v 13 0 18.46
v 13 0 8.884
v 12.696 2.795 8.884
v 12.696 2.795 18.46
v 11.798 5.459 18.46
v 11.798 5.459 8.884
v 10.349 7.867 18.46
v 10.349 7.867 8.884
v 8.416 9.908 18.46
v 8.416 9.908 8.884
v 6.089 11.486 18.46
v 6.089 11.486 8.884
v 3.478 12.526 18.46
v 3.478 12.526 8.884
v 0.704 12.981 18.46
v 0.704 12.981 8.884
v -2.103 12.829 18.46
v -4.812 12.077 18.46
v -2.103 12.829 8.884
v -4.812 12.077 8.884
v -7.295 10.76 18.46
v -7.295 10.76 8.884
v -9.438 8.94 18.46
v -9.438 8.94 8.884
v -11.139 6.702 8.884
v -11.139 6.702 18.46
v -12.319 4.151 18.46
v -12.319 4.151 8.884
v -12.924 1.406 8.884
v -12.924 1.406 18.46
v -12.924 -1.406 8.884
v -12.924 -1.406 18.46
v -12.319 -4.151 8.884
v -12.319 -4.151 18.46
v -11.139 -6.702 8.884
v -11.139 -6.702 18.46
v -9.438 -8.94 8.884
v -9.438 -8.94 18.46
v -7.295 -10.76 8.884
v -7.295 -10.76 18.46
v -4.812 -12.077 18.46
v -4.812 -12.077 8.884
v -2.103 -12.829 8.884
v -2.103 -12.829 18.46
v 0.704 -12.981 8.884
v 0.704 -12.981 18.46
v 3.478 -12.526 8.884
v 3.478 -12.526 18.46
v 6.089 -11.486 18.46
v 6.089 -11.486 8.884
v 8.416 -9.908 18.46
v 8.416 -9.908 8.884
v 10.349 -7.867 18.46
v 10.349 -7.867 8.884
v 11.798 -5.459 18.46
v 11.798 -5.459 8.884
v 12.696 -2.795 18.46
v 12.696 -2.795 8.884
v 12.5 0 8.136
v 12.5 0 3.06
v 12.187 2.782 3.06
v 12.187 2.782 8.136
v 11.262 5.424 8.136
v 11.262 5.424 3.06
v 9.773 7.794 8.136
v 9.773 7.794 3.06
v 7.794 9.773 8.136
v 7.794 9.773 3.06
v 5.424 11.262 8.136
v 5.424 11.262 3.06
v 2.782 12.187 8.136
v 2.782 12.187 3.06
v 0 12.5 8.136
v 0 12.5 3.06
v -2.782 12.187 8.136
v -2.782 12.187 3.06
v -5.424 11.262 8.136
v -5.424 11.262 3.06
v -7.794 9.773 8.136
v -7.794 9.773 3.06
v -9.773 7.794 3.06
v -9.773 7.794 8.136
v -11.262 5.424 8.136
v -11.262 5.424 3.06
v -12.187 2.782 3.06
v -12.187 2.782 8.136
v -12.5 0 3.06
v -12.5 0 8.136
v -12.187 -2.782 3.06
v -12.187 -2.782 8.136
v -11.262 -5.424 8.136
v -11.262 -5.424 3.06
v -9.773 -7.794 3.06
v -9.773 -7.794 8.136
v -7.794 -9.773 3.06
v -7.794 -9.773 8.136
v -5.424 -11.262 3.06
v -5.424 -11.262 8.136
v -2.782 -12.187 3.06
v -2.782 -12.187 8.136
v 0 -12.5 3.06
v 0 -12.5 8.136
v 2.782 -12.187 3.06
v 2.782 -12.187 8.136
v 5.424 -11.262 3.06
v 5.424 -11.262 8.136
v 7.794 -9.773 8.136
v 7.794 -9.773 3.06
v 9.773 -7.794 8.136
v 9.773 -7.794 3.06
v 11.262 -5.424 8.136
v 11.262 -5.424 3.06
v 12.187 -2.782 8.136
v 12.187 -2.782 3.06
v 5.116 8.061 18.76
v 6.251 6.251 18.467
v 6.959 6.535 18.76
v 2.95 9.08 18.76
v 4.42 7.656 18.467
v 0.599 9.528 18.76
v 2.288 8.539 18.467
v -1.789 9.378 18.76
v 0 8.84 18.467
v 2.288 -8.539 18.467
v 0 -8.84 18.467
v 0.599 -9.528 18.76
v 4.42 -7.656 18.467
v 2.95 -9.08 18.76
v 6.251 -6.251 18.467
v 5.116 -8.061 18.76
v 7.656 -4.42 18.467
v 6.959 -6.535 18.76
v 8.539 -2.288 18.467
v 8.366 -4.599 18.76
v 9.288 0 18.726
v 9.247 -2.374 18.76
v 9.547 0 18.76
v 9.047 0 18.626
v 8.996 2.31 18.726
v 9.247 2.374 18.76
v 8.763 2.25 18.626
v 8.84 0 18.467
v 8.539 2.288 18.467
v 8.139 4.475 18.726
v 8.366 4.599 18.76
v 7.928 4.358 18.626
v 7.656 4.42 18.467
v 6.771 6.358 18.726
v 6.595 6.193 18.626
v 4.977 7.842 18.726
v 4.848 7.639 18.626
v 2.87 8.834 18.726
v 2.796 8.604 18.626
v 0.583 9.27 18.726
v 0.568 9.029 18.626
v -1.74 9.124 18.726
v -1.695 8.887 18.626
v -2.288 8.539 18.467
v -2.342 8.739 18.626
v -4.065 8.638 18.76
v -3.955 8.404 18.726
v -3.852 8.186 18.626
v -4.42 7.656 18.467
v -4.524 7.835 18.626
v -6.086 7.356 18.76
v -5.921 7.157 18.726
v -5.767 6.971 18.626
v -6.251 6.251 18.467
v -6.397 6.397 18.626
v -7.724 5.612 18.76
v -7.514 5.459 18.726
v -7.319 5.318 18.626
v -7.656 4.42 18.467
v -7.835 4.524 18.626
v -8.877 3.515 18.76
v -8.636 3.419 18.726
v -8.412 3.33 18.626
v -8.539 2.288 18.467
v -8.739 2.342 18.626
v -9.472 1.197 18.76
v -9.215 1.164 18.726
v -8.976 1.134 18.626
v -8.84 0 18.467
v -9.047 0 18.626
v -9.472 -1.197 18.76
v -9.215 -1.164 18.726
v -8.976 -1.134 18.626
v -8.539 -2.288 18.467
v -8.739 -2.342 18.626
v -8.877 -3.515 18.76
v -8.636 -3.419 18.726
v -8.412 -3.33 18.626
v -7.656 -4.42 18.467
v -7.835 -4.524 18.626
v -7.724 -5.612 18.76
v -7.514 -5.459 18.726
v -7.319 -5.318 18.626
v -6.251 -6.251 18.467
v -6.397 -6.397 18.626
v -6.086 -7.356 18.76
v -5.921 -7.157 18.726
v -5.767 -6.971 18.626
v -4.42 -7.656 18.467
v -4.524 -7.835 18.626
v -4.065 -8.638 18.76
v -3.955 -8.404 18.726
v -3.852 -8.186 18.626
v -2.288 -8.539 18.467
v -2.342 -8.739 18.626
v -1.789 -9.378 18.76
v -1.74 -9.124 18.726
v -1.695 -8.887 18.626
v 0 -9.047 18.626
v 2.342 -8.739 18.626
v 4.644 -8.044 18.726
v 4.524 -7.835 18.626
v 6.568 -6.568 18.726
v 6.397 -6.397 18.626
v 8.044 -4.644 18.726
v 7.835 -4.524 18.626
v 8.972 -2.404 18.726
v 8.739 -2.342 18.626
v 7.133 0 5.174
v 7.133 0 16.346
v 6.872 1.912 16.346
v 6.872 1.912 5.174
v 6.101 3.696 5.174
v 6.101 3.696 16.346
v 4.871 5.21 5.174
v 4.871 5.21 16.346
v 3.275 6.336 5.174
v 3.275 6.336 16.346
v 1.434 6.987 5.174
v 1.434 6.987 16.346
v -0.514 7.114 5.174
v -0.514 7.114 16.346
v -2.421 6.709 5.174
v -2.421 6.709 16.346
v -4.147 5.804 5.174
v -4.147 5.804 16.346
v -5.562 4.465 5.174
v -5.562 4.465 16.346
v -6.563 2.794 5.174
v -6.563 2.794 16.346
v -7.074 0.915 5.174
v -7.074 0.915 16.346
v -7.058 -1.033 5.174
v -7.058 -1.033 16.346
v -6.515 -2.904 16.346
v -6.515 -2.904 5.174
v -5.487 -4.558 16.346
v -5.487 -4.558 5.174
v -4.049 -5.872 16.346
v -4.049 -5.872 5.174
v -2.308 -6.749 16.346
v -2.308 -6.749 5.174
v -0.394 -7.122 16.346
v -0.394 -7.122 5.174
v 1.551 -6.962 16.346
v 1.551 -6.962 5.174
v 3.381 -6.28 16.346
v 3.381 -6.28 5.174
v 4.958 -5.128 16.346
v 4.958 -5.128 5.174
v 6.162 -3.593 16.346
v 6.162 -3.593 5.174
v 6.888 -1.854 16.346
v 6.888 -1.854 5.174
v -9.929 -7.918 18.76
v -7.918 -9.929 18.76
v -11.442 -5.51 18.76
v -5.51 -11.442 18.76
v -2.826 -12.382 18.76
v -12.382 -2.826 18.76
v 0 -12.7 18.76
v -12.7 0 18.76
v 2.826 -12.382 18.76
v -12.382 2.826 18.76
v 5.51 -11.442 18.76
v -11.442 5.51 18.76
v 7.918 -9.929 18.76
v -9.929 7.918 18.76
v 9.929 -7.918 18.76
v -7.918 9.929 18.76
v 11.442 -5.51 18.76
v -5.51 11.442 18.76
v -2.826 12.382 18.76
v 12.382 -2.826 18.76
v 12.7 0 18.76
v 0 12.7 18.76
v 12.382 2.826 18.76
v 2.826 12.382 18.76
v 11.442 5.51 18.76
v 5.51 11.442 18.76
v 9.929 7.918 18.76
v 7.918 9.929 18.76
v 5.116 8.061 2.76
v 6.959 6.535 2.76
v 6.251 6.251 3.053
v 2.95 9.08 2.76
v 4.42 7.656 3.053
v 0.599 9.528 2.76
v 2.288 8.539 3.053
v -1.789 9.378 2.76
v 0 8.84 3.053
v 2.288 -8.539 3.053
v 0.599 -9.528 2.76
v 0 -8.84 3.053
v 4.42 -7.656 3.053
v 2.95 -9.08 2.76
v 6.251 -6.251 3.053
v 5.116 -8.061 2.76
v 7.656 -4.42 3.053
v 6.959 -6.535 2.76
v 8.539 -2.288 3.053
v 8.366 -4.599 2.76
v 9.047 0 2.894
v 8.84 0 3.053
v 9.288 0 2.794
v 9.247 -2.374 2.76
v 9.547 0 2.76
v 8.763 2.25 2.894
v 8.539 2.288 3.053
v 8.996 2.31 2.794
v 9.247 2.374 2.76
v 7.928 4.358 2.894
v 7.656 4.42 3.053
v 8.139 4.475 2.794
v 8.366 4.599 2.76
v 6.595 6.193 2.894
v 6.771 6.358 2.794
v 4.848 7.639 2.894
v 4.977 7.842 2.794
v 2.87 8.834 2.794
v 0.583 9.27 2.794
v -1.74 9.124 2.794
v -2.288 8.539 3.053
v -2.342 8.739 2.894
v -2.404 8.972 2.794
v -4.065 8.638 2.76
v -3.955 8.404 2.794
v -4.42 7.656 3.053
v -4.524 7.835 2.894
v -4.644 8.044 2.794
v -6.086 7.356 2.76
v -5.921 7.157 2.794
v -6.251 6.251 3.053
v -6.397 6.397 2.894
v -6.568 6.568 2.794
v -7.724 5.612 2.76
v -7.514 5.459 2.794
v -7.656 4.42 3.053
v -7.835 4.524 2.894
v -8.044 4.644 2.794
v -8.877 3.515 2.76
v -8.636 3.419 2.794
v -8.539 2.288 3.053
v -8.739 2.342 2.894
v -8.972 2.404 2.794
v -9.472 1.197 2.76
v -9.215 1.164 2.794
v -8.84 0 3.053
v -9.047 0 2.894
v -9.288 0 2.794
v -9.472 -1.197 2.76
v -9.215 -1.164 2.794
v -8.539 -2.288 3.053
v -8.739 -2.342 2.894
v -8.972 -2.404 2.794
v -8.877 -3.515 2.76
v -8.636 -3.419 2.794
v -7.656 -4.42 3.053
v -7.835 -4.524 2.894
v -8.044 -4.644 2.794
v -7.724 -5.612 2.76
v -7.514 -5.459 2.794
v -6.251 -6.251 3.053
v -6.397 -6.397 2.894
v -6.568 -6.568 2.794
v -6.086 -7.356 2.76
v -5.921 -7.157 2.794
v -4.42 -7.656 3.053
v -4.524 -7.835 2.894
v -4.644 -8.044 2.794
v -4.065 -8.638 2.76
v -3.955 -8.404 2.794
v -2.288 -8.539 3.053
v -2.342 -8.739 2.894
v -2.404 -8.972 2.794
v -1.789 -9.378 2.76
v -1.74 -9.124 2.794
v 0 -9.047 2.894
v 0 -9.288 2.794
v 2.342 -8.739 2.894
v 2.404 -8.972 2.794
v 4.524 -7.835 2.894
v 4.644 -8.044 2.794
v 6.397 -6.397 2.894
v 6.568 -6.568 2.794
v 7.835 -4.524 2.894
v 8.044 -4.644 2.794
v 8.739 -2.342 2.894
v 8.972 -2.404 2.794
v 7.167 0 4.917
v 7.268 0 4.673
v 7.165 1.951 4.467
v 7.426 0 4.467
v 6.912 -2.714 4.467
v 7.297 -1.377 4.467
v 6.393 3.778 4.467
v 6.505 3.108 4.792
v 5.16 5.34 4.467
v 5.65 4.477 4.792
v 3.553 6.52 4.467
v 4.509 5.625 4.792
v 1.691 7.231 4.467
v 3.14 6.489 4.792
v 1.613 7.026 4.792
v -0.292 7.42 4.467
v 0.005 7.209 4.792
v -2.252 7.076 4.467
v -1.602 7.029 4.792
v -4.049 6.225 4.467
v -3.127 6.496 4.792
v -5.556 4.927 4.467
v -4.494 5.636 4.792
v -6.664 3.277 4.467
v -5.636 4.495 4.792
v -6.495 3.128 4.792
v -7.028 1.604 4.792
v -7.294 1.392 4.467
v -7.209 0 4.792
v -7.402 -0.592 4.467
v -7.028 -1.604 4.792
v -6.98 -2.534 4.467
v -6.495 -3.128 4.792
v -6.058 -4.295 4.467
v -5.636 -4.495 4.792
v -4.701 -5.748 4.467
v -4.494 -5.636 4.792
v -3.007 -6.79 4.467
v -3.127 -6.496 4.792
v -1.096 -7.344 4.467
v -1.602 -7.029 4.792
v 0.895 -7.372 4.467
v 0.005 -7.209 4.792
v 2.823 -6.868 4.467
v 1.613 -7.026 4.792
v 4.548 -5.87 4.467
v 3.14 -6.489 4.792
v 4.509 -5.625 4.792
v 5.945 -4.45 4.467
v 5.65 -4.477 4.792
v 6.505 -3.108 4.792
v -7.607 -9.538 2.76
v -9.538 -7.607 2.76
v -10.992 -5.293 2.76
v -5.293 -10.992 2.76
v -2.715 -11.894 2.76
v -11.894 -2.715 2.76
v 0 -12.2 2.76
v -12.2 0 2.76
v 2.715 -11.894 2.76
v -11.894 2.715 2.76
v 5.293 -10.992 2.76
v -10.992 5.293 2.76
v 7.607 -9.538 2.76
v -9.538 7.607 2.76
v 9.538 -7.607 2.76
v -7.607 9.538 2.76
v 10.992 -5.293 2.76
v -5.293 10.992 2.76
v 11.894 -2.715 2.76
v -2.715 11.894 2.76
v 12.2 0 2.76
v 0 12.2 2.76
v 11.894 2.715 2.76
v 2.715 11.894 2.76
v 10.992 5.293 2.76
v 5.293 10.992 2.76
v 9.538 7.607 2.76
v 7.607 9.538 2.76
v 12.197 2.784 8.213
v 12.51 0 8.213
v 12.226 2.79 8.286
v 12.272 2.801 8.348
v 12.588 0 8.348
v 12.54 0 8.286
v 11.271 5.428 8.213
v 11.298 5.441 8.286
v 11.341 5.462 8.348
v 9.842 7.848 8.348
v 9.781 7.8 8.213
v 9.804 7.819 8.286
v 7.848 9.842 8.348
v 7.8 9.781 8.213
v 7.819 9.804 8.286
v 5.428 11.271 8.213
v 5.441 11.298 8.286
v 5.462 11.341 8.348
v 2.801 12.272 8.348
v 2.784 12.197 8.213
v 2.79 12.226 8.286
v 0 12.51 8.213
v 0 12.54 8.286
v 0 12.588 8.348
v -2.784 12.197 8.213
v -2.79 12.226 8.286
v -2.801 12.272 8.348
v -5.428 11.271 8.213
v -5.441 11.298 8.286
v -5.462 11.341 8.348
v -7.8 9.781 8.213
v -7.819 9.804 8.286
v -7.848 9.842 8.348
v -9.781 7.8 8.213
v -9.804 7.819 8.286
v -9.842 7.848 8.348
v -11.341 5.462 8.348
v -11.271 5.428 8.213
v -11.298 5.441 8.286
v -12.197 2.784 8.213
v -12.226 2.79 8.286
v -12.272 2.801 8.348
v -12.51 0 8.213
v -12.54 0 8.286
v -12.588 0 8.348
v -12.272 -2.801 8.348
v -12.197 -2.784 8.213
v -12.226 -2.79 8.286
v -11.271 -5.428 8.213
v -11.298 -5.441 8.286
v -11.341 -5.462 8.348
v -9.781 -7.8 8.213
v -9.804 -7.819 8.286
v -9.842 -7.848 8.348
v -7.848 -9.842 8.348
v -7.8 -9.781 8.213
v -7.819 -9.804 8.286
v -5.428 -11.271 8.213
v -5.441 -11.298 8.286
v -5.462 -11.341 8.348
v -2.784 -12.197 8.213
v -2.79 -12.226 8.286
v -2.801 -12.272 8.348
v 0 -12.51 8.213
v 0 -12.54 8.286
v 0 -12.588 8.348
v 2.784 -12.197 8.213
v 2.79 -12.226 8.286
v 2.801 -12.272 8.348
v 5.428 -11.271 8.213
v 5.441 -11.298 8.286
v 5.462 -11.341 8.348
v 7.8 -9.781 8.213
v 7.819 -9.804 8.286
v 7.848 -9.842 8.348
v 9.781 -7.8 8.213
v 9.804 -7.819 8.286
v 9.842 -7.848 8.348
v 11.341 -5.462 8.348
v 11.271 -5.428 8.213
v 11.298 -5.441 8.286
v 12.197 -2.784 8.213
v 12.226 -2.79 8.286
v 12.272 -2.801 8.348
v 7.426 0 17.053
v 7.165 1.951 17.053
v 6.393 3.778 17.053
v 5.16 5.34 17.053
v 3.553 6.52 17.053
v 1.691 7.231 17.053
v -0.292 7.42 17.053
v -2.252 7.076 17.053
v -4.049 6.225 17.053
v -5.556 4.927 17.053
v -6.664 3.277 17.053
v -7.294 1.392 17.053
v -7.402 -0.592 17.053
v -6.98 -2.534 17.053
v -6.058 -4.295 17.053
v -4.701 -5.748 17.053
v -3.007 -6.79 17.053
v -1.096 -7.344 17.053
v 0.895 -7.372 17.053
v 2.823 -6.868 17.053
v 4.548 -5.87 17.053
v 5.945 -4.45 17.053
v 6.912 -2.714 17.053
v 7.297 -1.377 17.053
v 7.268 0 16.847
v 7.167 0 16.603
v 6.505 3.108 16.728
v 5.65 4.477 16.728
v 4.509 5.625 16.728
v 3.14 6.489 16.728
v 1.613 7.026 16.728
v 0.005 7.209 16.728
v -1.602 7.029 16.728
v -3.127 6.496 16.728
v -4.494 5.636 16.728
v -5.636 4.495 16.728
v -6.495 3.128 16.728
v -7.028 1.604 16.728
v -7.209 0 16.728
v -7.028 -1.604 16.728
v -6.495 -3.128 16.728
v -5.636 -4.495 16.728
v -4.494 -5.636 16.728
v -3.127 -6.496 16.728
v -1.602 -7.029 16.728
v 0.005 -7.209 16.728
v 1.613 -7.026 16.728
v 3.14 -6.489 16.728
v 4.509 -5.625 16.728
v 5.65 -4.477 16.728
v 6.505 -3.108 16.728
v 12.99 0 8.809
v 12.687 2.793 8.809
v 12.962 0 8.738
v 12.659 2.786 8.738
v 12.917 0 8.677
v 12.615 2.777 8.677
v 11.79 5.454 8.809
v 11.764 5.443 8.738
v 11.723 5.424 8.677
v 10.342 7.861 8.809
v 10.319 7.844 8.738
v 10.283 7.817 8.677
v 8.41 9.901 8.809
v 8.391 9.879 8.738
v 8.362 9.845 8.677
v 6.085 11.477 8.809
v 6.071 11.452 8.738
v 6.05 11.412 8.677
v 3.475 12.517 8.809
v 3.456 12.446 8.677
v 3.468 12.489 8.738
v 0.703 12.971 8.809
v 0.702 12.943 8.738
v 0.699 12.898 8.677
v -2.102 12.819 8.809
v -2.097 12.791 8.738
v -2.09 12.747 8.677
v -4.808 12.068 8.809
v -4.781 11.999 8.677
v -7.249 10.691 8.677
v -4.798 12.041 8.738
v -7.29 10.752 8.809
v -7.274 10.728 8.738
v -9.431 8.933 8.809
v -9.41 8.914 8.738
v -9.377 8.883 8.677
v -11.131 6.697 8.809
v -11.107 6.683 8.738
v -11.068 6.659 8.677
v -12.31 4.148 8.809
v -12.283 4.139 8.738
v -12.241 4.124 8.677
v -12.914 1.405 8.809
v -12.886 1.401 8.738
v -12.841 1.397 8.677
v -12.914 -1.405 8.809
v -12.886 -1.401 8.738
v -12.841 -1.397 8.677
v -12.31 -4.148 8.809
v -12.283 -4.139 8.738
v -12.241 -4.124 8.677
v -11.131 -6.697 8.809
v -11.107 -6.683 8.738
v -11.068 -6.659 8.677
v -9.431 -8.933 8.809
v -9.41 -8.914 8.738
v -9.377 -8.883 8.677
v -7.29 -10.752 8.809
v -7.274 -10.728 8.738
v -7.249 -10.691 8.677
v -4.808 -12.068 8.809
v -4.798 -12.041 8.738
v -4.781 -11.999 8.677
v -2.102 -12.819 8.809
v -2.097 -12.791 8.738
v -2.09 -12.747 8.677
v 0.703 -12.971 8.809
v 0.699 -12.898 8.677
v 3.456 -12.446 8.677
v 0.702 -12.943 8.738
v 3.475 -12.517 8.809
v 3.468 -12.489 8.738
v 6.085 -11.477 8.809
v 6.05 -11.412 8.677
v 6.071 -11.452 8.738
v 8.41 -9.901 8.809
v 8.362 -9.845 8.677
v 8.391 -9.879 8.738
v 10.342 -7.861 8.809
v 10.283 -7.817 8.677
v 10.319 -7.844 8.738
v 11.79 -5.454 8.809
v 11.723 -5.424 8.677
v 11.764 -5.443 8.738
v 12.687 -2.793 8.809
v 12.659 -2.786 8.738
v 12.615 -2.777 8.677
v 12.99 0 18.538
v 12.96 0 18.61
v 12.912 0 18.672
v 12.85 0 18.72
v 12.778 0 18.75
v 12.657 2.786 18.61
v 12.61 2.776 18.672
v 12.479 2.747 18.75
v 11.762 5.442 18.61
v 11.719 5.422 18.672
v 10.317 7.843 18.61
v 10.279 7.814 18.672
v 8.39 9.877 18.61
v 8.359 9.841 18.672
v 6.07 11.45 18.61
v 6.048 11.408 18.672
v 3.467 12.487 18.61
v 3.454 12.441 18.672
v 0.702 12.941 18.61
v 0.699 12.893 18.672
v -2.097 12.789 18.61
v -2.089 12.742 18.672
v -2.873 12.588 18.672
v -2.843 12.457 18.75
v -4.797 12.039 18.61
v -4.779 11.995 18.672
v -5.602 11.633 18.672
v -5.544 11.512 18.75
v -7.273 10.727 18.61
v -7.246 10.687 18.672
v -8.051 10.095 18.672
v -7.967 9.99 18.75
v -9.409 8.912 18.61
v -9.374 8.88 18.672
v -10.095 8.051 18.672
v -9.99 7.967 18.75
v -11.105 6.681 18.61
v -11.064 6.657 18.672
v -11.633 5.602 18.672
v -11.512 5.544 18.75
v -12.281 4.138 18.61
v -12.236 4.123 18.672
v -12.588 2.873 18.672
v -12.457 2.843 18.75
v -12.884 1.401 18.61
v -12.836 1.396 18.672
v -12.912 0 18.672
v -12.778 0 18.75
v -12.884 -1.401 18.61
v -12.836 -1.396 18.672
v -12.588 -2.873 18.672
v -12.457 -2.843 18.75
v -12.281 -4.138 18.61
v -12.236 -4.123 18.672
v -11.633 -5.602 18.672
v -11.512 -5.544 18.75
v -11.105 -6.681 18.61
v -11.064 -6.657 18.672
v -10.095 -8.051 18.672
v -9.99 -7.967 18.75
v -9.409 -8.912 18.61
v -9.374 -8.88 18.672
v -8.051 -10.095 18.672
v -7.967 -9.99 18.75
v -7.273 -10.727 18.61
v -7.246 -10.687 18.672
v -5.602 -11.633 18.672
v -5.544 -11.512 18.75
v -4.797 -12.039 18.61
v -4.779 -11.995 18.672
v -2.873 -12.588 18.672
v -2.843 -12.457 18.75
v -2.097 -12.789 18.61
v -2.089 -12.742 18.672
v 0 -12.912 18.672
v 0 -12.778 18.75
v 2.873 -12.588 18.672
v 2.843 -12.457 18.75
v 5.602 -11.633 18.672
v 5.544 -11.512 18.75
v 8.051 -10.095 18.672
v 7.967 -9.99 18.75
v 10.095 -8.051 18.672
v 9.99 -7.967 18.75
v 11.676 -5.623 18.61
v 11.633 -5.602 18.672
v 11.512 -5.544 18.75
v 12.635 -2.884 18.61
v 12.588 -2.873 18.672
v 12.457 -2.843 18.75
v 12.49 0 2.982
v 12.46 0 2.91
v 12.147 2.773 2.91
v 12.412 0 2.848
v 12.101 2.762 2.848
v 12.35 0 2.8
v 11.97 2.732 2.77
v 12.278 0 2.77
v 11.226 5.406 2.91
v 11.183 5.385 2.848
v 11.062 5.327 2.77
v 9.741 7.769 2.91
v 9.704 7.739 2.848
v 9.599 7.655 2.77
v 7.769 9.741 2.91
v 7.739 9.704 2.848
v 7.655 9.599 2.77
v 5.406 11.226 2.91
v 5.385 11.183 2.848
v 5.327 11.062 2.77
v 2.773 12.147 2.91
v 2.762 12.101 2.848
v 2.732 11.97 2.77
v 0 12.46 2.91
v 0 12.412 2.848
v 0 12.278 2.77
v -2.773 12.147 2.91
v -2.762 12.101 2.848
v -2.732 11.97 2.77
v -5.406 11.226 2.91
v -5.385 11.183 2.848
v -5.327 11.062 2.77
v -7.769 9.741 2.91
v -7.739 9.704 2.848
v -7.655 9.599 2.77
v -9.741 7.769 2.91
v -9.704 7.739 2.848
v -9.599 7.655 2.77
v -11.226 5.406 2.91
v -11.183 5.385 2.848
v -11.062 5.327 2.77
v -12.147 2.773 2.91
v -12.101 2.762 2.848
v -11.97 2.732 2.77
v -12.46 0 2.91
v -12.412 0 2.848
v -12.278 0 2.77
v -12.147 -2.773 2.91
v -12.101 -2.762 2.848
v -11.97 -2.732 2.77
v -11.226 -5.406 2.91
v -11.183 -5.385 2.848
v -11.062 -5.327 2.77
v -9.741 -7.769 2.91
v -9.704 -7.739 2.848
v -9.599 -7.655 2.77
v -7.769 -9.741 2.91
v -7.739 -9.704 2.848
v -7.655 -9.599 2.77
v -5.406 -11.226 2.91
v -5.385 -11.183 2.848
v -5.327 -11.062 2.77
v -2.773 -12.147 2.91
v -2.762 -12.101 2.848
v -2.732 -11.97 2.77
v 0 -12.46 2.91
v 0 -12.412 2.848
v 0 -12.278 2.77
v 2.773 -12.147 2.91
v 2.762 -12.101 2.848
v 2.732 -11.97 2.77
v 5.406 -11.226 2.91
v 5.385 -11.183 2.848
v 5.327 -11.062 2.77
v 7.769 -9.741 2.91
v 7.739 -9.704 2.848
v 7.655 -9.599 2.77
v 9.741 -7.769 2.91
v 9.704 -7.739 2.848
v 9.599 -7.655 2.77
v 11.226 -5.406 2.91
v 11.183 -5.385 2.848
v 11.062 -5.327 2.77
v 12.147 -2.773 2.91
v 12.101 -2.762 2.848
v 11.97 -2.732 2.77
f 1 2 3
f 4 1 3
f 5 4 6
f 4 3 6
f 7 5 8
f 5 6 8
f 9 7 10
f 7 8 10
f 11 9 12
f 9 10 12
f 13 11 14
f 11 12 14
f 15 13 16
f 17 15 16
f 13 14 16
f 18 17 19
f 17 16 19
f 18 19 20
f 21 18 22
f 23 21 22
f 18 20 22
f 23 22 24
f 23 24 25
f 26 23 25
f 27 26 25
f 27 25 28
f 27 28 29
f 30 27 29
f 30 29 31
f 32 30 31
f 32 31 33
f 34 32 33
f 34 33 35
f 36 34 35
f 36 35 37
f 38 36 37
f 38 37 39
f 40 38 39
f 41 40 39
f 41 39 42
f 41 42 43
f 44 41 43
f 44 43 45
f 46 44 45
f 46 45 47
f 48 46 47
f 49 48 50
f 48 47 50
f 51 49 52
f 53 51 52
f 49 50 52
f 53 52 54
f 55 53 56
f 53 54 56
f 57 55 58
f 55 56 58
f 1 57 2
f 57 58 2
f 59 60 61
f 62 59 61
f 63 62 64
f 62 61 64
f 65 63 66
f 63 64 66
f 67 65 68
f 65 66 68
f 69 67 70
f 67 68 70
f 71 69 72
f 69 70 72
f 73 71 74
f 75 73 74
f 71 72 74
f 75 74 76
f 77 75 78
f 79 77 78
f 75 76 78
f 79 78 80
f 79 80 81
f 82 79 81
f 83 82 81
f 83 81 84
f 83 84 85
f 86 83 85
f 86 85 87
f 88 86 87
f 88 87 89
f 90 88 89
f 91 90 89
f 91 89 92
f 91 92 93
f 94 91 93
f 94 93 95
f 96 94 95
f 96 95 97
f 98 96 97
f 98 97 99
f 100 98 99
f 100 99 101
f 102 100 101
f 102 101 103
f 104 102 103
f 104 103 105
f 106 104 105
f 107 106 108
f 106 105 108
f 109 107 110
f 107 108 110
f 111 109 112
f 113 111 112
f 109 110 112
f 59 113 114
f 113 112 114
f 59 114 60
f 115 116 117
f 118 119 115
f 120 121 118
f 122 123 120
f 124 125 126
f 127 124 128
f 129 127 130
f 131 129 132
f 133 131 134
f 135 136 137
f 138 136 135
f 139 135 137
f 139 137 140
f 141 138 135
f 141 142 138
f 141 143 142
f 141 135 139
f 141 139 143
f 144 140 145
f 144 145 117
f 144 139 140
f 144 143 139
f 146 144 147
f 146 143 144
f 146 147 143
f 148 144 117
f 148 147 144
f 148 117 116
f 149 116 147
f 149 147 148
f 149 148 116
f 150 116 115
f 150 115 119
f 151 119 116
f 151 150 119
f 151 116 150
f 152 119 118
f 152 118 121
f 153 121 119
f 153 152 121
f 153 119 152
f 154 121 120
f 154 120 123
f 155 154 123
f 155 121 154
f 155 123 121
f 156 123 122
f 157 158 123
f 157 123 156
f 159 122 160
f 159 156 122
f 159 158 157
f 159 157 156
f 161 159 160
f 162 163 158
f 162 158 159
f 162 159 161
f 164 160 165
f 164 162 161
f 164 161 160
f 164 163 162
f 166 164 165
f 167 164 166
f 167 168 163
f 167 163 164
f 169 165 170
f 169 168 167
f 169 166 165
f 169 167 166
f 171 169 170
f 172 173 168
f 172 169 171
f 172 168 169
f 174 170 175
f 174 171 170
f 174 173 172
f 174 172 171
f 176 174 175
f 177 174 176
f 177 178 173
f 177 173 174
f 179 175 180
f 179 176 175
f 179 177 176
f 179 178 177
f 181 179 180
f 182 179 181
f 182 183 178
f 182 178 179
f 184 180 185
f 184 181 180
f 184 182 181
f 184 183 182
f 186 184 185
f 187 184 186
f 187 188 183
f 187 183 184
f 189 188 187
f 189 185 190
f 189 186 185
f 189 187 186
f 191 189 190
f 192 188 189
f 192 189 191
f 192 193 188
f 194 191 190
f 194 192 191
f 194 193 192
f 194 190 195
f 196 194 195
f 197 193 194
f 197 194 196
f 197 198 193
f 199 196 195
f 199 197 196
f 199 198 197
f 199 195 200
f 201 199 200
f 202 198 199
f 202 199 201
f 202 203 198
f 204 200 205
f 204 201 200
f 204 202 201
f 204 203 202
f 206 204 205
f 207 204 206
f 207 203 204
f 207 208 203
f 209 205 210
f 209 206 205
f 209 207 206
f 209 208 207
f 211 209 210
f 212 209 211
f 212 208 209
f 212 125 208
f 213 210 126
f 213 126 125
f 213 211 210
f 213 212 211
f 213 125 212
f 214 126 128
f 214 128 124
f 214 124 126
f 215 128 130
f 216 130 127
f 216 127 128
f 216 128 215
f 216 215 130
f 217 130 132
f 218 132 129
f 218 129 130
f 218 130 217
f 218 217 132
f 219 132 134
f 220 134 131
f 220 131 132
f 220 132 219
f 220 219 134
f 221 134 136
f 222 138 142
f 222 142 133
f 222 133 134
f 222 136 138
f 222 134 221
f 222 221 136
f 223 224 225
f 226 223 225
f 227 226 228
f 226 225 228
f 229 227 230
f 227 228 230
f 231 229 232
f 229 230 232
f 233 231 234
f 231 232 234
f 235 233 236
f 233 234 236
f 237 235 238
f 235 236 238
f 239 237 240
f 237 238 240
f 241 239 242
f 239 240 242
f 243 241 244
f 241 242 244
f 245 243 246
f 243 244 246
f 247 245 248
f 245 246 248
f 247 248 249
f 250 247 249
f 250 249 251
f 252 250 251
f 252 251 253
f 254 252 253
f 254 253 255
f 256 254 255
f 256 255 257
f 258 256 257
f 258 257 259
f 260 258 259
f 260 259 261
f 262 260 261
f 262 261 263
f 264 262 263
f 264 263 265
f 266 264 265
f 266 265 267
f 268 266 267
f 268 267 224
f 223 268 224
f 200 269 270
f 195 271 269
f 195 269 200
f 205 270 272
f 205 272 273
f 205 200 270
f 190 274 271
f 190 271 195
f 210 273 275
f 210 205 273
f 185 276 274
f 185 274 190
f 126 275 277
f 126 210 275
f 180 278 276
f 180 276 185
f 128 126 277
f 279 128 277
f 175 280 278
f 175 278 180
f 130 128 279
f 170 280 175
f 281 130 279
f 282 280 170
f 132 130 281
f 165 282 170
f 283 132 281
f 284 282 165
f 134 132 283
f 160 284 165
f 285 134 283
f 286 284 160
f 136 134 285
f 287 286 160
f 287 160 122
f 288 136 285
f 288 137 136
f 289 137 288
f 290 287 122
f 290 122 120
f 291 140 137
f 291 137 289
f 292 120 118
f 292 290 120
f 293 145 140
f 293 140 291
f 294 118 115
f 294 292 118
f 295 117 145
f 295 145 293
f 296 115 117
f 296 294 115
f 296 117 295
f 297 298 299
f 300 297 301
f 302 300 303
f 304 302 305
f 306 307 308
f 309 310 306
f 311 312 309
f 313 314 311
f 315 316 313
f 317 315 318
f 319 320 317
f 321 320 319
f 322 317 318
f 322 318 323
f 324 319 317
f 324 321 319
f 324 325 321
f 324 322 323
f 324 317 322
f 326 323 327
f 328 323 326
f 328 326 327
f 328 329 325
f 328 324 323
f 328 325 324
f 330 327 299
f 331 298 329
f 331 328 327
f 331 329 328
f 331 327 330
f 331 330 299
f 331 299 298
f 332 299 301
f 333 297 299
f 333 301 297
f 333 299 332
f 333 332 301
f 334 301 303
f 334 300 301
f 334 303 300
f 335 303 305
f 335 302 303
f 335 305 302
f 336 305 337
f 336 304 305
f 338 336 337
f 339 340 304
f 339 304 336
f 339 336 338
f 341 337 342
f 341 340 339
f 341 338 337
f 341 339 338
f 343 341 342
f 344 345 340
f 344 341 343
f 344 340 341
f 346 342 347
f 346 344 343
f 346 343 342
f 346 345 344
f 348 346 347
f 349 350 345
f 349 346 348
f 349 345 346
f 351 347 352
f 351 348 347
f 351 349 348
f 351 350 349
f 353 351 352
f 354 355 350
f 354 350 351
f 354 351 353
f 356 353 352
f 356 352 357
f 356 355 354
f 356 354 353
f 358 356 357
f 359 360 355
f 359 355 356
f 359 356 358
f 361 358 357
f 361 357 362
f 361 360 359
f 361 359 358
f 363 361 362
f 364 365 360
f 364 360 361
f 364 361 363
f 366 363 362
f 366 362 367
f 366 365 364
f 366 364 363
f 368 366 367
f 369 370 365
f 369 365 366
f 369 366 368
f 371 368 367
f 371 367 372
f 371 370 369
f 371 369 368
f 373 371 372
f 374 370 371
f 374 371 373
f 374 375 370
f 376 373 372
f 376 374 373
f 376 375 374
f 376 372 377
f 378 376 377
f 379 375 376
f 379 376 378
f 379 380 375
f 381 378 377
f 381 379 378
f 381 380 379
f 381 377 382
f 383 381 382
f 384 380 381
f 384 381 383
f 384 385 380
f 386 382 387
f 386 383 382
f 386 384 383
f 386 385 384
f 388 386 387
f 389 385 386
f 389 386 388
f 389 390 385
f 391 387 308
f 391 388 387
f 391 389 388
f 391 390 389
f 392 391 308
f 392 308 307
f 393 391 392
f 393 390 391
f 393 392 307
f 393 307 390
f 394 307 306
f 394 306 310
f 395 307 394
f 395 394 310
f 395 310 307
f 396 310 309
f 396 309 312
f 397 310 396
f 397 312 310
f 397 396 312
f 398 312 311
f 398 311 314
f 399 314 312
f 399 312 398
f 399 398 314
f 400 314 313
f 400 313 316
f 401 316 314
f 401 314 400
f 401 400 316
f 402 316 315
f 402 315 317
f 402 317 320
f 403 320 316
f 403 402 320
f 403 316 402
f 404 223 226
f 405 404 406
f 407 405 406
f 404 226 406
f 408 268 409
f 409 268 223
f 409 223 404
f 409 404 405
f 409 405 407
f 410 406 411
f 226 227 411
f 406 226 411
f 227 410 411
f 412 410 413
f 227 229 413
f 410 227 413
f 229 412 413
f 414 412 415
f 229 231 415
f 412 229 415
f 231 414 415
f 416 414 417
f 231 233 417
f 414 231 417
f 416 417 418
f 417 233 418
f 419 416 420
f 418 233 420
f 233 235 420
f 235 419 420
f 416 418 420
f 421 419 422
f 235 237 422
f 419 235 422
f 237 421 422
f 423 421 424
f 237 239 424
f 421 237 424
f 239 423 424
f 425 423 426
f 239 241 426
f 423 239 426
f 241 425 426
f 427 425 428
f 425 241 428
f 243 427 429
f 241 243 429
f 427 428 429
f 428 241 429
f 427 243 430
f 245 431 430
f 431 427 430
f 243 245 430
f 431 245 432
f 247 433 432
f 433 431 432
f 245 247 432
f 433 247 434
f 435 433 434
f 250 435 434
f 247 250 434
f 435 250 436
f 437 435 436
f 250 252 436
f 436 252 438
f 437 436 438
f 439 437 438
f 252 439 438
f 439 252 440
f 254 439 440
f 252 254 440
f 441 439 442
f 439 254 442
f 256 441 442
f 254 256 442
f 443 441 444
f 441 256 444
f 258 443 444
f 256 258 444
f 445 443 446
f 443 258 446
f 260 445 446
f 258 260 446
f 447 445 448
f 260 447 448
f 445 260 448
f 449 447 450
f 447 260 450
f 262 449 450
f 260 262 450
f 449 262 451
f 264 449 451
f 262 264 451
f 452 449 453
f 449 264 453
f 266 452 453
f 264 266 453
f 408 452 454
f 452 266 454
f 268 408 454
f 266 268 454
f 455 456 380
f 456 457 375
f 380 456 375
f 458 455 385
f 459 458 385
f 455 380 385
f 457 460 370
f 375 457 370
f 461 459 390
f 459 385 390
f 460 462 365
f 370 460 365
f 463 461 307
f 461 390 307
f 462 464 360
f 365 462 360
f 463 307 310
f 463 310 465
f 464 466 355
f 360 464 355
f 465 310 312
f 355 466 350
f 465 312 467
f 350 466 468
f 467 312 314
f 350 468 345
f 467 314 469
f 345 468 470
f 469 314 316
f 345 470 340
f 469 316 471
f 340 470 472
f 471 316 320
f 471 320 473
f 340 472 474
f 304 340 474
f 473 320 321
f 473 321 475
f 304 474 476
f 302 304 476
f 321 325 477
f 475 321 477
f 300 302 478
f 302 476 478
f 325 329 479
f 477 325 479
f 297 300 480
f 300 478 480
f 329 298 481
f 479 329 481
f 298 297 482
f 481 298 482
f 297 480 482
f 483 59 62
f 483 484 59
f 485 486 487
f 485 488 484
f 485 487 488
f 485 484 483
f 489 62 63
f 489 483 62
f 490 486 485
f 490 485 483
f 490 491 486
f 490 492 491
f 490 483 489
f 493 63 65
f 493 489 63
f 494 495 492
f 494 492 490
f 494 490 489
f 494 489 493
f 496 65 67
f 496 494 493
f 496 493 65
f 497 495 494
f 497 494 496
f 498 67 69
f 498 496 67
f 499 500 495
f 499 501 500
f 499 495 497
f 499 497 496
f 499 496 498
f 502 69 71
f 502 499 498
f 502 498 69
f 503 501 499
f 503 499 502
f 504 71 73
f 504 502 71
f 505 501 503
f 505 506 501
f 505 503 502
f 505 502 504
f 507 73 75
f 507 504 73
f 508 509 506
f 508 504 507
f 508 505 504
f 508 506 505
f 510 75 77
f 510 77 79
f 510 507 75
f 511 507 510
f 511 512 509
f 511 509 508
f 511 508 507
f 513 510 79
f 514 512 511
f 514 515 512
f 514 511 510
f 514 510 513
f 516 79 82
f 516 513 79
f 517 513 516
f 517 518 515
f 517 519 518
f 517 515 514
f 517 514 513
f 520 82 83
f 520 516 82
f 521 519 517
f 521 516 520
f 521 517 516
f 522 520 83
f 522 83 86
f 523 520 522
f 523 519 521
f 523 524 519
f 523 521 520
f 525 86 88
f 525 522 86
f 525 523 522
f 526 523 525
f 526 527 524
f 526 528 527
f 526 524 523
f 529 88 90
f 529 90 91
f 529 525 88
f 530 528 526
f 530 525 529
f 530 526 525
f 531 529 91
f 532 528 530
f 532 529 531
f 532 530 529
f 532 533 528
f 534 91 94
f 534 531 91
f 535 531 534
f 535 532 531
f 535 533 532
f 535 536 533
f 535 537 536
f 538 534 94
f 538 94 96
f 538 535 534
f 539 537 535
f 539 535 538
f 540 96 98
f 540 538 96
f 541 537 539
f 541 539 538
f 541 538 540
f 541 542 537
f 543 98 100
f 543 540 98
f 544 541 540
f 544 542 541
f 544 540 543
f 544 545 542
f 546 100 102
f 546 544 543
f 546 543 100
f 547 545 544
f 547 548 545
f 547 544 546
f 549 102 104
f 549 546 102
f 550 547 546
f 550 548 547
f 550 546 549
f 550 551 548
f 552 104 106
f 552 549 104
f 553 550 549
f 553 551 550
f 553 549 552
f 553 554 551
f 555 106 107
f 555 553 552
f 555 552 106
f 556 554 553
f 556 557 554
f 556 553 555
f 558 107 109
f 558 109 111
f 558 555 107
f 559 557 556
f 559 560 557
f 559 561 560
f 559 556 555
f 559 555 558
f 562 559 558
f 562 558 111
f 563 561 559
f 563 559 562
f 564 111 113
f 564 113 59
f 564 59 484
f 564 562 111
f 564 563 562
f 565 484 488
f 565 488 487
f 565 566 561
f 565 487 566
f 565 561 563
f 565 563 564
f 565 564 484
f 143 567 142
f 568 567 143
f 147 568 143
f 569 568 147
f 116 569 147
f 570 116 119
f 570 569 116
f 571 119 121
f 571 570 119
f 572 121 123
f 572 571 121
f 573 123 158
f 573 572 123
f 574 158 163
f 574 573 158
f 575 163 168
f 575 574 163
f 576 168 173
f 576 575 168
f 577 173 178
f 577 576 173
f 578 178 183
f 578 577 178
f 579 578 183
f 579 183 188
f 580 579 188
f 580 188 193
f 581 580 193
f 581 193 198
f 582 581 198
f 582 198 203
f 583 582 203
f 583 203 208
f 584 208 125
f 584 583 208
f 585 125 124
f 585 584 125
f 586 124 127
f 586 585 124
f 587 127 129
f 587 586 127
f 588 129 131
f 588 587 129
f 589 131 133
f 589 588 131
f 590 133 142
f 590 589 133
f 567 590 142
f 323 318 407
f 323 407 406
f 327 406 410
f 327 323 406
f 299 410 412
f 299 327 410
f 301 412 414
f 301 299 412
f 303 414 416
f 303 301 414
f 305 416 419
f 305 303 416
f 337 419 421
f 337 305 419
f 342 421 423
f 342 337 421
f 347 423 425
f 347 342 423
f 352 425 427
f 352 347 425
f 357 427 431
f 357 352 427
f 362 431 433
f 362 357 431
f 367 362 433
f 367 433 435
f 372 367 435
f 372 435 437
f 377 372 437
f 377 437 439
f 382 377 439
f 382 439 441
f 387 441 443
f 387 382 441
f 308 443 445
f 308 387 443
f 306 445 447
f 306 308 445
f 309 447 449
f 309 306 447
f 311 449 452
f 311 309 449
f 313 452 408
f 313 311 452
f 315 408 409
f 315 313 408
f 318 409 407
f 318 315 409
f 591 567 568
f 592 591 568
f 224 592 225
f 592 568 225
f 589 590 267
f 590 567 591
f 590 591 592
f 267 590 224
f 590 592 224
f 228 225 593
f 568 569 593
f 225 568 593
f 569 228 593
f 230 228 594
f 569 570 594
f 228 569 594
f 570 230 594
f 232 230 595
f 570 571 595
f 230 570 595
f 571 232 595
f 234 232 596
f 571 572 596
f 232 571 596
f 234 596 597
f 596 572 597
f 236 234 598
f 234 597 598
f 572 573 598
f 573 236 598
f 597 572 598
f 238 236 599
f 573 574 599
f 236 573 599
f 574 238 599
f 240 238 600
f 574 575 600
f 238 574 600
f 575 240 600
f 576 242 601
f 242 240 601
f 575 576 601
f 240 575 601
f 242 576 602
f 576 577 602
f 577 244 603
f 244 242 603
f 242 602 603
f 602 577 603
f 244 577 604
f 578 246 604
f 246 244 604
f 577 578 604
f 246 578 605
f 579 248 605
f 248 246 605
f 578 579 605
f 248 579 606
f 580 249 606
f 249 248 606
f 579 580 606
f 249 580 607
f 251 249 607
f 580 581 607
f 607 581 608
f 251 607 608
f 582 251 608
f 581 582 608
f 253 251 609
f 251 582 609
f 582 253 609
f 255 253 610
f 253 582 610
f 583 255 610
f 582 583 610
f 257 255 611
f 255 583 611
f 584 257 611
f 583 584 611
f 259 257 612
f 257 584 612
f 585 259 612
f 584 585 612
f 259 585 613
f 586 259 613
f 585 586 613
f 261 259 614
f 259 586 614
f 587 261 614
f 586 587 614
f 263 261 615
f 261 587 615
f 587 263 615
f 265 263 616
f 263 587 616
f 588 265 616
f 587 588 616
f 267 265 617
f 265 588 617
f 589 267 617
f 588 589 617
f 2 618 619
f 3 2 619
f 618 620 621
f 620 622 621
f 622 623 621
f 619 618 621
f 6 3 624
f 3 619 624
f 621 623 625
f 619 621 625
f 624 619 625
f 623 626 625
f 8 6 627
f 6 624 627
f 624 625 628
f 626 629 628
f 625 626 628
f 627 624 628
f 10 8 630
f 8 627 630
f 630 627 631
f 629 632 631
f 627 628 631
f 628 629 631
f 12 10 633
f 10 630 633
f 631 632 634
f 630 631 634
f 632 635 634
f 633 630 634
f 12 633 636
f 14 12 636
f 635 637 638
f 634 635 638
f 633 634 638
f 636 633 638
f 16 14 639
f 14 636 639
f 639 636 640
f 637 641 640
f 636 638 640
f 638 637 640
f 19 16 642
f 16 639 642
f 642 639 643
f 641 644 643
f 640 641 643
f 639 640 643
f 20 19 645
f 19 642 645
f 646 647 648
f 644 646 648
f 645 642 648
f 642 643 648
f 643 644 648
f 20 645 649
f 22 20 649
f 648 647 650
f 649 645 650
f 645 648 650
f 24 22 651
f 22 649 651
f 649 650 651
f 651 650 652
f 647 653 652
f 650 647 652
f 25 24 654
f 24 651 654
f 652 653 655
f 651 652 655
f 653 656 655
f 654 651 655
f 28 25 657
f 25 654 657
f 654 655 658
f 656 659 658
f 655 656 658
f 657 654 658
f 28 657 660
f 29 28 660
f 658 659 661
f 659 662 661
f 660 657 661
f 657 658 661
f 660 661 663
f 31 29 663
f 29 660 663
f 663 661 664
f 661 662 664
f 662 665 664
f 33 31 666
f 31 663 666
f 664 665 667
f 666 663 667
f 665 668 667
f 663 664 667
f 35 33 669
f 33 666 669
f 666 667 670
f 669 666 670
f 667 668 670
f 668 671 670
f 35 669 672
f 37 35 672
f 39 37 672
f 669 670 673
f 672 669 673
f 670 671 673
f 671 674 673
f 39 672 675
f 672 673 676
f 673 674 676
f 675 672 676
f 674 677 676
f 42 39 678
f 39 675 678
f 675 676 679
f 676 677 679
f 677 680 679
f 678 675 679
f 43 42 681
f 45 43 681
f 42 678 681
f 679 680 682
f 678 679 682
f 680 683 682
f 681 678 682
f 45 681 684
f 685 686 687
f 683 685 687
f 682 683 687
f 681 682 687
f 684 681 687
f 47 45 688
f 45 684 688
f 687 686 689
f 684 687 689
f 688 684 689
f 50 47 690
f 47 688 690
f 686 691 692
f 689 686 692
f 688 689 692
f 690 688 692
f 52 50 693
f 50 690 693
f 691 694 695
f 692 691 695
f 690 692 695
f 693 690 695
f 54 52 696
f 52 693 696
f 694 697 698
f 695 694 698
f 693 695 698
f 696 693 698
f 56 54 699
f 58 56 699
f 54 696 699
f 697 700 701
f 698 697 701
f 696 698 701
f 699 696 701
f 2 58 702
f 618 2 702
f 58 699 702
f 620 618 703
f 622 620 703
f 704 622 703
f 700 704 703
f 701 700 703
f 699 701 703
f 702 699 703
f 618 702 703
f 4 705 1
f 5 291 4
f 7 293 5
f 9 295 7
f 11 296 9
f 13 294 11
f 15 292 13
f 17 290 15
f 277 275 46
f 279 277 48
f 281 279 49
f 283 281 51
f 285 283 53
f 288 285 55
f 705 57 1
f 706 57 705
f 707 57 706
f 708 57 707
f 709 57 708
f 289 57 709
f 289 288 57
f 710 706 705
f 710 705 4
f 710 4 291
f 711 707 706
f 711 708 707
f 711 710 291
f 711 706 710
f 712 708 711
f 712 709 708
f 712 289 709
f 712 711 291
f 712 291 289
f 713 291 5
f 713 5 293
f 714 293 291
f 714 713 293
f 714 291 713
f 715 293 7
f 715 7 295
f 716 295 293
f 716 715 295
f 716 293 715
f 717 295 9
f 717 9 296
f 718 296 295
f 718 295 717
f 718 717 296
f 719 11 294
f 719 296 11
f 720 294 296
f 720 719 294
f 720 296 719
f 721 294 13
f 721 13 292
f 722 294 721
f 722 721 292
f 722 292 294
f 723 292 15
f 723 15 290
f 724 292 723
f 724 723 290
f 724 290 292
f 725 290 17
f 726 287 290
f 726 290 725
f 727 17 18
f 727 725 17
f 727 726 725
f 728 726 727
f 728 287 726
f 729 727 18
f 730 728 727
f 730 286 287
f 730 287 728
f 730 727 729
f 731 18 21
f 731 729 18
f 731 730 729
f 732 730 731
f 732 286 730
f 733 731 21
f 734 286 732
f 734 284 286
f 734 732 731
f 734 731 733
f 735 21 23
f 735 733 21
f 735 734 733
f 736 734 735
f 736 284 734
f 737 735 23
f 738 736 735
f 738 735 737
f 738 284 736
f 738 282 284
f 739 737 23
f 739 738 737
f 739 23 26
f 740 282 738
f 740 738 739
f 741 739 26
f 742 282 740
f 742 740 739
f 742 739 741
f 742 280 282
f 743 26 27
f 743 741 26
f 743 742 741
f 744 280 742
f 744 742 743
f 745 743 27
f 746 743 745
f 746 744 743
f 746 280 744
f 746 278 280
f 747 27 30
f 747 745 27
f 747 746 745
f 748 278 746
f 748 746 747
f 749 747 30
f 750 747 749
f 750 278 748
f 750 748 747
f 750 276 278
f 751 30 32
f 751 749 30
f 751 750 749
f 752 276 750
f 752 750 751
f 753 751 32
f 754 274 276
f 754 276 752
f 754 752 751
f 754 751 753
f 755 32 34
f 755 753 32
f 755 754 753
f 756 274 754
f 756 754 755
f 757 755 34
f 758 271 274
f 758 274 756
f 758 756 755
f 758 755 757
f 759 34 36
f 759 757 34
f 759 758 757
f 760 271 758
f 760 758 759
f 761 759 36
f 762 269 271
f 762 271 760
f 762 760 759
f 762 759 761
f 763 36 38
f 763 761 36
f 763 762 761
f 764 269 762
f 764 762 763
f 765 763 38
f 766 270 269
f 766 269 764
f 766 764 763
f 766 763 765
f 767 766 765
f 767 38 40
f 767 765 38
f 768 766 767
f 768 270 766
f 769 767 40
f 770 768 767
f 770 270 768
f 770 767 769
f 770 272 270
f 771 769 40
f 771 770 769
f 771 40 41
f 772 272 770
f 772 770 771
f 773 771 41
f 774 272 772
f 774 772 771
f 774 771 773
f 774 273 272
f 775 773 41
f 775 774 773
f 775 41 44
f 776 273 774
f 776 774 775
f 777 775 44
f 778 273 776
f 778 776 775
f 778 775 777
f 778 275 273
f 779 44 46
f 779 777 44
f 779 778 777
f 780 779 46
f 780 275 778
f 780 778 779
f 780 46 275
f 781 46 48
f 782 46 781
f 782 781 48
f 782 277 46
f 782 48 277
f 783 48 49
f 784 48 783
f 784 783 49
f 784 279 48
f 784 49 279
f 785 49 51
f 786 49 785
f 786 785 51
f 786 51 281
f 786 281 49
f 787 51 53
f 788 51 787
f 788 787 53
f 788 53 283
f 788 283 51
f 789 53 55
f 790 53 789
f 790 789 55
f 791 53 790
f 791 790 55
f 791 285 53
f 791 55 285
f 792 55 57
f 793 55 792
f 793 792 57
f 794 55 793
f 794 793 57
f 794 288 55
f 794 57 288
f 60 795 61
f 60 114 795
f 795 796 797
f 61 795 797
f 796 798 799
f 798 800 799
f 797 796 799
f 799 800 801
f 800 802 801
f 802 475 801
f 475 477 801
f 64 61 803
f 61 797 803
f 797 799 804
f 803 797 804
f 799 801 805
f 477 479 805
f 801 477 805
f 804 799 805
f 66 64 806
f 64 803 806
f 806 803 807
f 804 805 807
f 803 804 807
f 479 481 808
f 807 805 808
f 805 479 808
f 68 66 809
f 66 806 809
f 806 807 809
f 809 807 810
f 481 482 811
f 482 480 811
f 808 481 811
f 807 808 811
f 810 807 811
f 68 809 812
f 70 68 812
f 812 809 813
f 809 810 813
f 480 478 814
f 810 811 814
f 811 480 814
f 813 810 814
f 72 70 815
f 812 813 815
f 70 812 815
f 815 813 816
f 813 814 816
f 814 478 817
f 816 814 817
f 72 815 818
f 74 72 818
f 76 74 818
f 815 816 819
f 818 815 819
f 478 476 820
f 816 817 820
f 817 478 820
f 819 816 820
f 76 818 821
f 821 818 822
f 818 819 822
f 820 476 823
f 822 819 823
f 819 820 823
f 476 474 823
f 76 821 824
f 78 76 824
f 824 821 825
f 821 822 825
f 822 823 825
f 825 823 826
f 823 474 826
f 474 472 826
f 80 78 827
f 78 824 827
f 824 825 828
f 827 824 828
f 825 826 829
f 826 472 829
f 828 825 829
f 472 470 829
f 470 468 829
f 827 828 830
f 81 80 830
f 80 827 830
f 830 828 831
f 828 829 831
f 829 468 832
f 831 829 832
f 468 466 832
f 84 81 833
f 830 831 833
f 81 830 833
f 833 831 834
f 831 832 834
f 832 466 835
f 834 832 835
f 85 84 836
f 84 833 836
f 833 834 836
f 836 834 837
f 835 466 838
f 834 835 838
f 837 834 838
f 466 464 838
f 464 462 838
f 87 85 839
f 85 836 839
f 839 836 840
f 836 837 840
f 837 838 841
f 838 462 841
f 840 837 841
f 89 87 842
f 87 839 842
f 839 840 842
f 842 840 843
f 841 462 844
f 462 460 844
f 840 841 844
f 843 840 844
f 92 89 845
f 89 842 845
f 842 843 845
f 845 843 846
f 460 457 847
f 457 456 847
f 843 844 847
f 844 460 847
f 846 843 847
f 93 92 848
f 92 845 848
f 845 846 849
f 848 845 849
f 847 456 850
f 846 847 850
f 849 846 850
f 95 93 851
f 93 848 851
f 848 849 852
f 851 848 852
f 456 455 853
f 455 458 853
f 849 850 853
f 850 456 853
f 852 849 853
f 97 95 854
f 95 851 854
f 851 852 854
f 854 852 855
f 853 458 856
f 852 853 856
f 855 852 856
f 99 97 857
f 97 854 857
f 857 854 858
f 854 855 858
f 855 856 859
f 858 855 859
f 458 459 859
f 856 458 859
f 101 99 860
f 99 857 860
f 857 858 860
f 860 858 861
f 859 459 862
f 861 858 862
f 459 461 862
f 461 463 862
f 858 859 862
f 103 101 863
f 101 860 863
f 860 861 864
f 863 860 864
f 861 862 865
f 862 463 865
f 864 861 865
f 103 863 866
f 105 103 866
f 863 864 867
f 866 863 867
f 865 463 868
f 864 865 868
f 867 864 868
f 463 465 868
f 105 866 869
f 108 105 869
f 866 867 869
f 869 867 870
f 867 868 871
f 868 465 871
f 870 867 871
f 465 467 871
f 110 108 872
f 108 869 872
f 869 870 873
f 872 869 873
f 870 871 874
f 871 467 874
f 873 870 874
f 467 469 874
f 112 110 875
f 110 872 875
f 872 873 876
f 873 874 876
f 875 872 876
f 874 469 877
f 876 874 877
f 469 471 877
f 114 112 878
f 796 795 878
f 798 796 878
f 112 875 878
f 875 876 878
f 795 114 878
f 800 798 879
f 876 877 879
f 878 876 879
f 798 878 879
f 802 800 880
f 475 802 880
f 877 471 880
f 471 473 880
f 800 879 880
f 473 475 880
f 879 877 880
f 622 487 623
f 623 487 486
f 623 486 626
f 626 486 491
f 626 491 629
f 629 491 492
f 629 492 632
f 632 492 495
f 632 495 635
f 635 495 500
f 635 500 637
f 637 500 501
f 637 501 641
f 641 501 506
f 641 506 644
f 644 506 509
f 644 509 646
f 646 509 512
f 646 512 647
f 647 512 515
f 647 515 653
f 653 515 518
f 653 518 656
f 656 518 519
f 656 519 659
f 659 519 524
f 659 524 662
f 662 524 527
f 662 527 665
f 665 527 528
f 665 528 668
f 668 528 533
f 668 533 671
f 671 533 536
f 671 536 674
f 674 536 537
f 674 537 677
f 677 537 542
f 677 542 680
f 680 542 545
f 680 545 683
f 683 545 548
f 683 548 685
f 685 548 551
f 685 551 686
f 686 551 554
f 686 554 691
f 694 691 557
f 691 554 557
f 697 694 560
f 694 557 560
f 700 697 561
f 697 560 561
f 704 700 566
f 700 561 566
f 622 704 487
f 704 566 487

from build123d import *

# Parameters (mm, degrees)
SKETCH1_R           = 5
BOSS_EXTRUDE1_DEPTH = 2.76
SKETCH4_R           = 12.5
BOSS_EXTRUDE2_DEPTH = 6
SKETCH5_R           = 13
BOSS_EXTRUDE3_DEPTH = 10
FILLET2_R           = 0.3
FILLET3_R           = 0.3
SKETCH6_R           = 7.132829082
CUT_EXTRUDE1_DEPTH  = 31
CHAMFER1_SIZE       = 2
FILLET4_R           = 1
CHAMFER3_SIZE       = 0.5
FILLET7_R           = 0.3


with BuildPart() as part:
    # Sketch1 → Boss-Extrude1 (new body)
    with BuildSketch(Plane.XY):
        Circle(SKETCH1_R)
    extrude(amount=BOSS_EXTRUDE1_DEPTH)

    # Sketch4 → Boss-Extrude2 (add)
    with BuildSketch(Plane.XY.offset(2.76)):
        Circle(SKETCH4_R)
    extrude(amount=BOSS_EXTRUDE2_DEPTH)

    # Sketch5 → Boss-Extrude3 (add)
    with BuildSketch(Plane.XY.offset(8.76)):
        Circle(SKETCH5_R)
    extrude(amount=BOSS_EXTRUDE3_DEPTH)

    # Fillet2
    fillet2_edges = [part.edges().sort_by_distance(p)[0] for p in [
        (-5, 0, 2.76),
    ]]
    fillet(fillet2_edges, radius=FILLET2_R)

    # Fillet3
    fillet3_edges = [part.edges().sort_by_distance(p)[0] for p in [
        (-13, 0, 18.76),
    ]]
    fillet(fillet3_edges, radius=FILLET3_R)

    # Sketch6 → Cut-Extrude1 (cut)
    with BuildSketch(Plane.XY.offset(18.76)):
        Circle(SKETCH6_R)
    extrude(amount=-CUT_EXTRUDE1_DEPTH, mode=Mode.SUBTRACT)

    # Chamfer1
    chamfer1_edges = [part.edges().sort_by_distance(p)[0] for p in [
        (-7.132829082, 0, 2.76),
        (-7.132829082, 0, 18.76),
    ]]
    chamfer(chamfer1_edges, length=CHAMFER1_SIZE)

    # Fillet4
    fillet4_edges = [part.edges().sort_by_distance(p)[0] for p in [
        (-9.132829082, 0, 2.76),
        (-7.132829082, 0, 16.76),
        (-7.132829082, 0, 4.76),
        (-9.132829082, 0, 18.76),
    ]]
    fillet(fillet4_edges, radius=FILLET4_R)

    # Chamfer3
    chamfer3_edges = [part.edges().sort_by_distance(p)[0] for p in [
        (-12.5, 0, 8.76),
    ]]
    chamfer(chamfer3_edges, length=CHAMFER3_SIZE - 0.0001)  # a hair under: the kernel refuses the full size

    # Fillet6: read off the stored shape, not the designer's step
    # Fillet6 outline → Fillet6 (revolve, cut)
    with BuildSketch(Plane.XZ):
        with BuildLine():
            Line((13, 8.672132034), (13, 8.884264069))
            ThreePointArc((13, 8.884264069), (12.97716386, 8.769459039), (12.912132034, 8.672132034))
            Line((12.912132034, 8.672132034), (13, 8.672132034))
        make_face()
    revolve(axis=Axis((0, 0, 0), (0, 0, 1)), mode=Mode.SUBTRACT)

    # Fillet6 2 outline → Fillet6 2 (revolve)
    with BuildSketch(Plane.XZ):
        with BuildLine():
            ThreePointArc((12.5, 8.135735931), (12.52283614, 8.250540961), (12.587867966, 8.347867966))
            Line((12.587867966, 8.347867966), (12.5, 8.347867966))
            Line((12.5, 8.347867966), (12.5, 8.135735931))
        make_face()
    revolve(axis=Axis((0, 0, 0), (0, 0, 1)))

    # Fillet7
    fillet7_edges = [part.edges().sort_by_distance(p)[0] for p in [
        (-12.5, 0, 2.76),
    ]]
    fillet(fillet7_edges, radius=FILLET7_R)


solid = part.part
